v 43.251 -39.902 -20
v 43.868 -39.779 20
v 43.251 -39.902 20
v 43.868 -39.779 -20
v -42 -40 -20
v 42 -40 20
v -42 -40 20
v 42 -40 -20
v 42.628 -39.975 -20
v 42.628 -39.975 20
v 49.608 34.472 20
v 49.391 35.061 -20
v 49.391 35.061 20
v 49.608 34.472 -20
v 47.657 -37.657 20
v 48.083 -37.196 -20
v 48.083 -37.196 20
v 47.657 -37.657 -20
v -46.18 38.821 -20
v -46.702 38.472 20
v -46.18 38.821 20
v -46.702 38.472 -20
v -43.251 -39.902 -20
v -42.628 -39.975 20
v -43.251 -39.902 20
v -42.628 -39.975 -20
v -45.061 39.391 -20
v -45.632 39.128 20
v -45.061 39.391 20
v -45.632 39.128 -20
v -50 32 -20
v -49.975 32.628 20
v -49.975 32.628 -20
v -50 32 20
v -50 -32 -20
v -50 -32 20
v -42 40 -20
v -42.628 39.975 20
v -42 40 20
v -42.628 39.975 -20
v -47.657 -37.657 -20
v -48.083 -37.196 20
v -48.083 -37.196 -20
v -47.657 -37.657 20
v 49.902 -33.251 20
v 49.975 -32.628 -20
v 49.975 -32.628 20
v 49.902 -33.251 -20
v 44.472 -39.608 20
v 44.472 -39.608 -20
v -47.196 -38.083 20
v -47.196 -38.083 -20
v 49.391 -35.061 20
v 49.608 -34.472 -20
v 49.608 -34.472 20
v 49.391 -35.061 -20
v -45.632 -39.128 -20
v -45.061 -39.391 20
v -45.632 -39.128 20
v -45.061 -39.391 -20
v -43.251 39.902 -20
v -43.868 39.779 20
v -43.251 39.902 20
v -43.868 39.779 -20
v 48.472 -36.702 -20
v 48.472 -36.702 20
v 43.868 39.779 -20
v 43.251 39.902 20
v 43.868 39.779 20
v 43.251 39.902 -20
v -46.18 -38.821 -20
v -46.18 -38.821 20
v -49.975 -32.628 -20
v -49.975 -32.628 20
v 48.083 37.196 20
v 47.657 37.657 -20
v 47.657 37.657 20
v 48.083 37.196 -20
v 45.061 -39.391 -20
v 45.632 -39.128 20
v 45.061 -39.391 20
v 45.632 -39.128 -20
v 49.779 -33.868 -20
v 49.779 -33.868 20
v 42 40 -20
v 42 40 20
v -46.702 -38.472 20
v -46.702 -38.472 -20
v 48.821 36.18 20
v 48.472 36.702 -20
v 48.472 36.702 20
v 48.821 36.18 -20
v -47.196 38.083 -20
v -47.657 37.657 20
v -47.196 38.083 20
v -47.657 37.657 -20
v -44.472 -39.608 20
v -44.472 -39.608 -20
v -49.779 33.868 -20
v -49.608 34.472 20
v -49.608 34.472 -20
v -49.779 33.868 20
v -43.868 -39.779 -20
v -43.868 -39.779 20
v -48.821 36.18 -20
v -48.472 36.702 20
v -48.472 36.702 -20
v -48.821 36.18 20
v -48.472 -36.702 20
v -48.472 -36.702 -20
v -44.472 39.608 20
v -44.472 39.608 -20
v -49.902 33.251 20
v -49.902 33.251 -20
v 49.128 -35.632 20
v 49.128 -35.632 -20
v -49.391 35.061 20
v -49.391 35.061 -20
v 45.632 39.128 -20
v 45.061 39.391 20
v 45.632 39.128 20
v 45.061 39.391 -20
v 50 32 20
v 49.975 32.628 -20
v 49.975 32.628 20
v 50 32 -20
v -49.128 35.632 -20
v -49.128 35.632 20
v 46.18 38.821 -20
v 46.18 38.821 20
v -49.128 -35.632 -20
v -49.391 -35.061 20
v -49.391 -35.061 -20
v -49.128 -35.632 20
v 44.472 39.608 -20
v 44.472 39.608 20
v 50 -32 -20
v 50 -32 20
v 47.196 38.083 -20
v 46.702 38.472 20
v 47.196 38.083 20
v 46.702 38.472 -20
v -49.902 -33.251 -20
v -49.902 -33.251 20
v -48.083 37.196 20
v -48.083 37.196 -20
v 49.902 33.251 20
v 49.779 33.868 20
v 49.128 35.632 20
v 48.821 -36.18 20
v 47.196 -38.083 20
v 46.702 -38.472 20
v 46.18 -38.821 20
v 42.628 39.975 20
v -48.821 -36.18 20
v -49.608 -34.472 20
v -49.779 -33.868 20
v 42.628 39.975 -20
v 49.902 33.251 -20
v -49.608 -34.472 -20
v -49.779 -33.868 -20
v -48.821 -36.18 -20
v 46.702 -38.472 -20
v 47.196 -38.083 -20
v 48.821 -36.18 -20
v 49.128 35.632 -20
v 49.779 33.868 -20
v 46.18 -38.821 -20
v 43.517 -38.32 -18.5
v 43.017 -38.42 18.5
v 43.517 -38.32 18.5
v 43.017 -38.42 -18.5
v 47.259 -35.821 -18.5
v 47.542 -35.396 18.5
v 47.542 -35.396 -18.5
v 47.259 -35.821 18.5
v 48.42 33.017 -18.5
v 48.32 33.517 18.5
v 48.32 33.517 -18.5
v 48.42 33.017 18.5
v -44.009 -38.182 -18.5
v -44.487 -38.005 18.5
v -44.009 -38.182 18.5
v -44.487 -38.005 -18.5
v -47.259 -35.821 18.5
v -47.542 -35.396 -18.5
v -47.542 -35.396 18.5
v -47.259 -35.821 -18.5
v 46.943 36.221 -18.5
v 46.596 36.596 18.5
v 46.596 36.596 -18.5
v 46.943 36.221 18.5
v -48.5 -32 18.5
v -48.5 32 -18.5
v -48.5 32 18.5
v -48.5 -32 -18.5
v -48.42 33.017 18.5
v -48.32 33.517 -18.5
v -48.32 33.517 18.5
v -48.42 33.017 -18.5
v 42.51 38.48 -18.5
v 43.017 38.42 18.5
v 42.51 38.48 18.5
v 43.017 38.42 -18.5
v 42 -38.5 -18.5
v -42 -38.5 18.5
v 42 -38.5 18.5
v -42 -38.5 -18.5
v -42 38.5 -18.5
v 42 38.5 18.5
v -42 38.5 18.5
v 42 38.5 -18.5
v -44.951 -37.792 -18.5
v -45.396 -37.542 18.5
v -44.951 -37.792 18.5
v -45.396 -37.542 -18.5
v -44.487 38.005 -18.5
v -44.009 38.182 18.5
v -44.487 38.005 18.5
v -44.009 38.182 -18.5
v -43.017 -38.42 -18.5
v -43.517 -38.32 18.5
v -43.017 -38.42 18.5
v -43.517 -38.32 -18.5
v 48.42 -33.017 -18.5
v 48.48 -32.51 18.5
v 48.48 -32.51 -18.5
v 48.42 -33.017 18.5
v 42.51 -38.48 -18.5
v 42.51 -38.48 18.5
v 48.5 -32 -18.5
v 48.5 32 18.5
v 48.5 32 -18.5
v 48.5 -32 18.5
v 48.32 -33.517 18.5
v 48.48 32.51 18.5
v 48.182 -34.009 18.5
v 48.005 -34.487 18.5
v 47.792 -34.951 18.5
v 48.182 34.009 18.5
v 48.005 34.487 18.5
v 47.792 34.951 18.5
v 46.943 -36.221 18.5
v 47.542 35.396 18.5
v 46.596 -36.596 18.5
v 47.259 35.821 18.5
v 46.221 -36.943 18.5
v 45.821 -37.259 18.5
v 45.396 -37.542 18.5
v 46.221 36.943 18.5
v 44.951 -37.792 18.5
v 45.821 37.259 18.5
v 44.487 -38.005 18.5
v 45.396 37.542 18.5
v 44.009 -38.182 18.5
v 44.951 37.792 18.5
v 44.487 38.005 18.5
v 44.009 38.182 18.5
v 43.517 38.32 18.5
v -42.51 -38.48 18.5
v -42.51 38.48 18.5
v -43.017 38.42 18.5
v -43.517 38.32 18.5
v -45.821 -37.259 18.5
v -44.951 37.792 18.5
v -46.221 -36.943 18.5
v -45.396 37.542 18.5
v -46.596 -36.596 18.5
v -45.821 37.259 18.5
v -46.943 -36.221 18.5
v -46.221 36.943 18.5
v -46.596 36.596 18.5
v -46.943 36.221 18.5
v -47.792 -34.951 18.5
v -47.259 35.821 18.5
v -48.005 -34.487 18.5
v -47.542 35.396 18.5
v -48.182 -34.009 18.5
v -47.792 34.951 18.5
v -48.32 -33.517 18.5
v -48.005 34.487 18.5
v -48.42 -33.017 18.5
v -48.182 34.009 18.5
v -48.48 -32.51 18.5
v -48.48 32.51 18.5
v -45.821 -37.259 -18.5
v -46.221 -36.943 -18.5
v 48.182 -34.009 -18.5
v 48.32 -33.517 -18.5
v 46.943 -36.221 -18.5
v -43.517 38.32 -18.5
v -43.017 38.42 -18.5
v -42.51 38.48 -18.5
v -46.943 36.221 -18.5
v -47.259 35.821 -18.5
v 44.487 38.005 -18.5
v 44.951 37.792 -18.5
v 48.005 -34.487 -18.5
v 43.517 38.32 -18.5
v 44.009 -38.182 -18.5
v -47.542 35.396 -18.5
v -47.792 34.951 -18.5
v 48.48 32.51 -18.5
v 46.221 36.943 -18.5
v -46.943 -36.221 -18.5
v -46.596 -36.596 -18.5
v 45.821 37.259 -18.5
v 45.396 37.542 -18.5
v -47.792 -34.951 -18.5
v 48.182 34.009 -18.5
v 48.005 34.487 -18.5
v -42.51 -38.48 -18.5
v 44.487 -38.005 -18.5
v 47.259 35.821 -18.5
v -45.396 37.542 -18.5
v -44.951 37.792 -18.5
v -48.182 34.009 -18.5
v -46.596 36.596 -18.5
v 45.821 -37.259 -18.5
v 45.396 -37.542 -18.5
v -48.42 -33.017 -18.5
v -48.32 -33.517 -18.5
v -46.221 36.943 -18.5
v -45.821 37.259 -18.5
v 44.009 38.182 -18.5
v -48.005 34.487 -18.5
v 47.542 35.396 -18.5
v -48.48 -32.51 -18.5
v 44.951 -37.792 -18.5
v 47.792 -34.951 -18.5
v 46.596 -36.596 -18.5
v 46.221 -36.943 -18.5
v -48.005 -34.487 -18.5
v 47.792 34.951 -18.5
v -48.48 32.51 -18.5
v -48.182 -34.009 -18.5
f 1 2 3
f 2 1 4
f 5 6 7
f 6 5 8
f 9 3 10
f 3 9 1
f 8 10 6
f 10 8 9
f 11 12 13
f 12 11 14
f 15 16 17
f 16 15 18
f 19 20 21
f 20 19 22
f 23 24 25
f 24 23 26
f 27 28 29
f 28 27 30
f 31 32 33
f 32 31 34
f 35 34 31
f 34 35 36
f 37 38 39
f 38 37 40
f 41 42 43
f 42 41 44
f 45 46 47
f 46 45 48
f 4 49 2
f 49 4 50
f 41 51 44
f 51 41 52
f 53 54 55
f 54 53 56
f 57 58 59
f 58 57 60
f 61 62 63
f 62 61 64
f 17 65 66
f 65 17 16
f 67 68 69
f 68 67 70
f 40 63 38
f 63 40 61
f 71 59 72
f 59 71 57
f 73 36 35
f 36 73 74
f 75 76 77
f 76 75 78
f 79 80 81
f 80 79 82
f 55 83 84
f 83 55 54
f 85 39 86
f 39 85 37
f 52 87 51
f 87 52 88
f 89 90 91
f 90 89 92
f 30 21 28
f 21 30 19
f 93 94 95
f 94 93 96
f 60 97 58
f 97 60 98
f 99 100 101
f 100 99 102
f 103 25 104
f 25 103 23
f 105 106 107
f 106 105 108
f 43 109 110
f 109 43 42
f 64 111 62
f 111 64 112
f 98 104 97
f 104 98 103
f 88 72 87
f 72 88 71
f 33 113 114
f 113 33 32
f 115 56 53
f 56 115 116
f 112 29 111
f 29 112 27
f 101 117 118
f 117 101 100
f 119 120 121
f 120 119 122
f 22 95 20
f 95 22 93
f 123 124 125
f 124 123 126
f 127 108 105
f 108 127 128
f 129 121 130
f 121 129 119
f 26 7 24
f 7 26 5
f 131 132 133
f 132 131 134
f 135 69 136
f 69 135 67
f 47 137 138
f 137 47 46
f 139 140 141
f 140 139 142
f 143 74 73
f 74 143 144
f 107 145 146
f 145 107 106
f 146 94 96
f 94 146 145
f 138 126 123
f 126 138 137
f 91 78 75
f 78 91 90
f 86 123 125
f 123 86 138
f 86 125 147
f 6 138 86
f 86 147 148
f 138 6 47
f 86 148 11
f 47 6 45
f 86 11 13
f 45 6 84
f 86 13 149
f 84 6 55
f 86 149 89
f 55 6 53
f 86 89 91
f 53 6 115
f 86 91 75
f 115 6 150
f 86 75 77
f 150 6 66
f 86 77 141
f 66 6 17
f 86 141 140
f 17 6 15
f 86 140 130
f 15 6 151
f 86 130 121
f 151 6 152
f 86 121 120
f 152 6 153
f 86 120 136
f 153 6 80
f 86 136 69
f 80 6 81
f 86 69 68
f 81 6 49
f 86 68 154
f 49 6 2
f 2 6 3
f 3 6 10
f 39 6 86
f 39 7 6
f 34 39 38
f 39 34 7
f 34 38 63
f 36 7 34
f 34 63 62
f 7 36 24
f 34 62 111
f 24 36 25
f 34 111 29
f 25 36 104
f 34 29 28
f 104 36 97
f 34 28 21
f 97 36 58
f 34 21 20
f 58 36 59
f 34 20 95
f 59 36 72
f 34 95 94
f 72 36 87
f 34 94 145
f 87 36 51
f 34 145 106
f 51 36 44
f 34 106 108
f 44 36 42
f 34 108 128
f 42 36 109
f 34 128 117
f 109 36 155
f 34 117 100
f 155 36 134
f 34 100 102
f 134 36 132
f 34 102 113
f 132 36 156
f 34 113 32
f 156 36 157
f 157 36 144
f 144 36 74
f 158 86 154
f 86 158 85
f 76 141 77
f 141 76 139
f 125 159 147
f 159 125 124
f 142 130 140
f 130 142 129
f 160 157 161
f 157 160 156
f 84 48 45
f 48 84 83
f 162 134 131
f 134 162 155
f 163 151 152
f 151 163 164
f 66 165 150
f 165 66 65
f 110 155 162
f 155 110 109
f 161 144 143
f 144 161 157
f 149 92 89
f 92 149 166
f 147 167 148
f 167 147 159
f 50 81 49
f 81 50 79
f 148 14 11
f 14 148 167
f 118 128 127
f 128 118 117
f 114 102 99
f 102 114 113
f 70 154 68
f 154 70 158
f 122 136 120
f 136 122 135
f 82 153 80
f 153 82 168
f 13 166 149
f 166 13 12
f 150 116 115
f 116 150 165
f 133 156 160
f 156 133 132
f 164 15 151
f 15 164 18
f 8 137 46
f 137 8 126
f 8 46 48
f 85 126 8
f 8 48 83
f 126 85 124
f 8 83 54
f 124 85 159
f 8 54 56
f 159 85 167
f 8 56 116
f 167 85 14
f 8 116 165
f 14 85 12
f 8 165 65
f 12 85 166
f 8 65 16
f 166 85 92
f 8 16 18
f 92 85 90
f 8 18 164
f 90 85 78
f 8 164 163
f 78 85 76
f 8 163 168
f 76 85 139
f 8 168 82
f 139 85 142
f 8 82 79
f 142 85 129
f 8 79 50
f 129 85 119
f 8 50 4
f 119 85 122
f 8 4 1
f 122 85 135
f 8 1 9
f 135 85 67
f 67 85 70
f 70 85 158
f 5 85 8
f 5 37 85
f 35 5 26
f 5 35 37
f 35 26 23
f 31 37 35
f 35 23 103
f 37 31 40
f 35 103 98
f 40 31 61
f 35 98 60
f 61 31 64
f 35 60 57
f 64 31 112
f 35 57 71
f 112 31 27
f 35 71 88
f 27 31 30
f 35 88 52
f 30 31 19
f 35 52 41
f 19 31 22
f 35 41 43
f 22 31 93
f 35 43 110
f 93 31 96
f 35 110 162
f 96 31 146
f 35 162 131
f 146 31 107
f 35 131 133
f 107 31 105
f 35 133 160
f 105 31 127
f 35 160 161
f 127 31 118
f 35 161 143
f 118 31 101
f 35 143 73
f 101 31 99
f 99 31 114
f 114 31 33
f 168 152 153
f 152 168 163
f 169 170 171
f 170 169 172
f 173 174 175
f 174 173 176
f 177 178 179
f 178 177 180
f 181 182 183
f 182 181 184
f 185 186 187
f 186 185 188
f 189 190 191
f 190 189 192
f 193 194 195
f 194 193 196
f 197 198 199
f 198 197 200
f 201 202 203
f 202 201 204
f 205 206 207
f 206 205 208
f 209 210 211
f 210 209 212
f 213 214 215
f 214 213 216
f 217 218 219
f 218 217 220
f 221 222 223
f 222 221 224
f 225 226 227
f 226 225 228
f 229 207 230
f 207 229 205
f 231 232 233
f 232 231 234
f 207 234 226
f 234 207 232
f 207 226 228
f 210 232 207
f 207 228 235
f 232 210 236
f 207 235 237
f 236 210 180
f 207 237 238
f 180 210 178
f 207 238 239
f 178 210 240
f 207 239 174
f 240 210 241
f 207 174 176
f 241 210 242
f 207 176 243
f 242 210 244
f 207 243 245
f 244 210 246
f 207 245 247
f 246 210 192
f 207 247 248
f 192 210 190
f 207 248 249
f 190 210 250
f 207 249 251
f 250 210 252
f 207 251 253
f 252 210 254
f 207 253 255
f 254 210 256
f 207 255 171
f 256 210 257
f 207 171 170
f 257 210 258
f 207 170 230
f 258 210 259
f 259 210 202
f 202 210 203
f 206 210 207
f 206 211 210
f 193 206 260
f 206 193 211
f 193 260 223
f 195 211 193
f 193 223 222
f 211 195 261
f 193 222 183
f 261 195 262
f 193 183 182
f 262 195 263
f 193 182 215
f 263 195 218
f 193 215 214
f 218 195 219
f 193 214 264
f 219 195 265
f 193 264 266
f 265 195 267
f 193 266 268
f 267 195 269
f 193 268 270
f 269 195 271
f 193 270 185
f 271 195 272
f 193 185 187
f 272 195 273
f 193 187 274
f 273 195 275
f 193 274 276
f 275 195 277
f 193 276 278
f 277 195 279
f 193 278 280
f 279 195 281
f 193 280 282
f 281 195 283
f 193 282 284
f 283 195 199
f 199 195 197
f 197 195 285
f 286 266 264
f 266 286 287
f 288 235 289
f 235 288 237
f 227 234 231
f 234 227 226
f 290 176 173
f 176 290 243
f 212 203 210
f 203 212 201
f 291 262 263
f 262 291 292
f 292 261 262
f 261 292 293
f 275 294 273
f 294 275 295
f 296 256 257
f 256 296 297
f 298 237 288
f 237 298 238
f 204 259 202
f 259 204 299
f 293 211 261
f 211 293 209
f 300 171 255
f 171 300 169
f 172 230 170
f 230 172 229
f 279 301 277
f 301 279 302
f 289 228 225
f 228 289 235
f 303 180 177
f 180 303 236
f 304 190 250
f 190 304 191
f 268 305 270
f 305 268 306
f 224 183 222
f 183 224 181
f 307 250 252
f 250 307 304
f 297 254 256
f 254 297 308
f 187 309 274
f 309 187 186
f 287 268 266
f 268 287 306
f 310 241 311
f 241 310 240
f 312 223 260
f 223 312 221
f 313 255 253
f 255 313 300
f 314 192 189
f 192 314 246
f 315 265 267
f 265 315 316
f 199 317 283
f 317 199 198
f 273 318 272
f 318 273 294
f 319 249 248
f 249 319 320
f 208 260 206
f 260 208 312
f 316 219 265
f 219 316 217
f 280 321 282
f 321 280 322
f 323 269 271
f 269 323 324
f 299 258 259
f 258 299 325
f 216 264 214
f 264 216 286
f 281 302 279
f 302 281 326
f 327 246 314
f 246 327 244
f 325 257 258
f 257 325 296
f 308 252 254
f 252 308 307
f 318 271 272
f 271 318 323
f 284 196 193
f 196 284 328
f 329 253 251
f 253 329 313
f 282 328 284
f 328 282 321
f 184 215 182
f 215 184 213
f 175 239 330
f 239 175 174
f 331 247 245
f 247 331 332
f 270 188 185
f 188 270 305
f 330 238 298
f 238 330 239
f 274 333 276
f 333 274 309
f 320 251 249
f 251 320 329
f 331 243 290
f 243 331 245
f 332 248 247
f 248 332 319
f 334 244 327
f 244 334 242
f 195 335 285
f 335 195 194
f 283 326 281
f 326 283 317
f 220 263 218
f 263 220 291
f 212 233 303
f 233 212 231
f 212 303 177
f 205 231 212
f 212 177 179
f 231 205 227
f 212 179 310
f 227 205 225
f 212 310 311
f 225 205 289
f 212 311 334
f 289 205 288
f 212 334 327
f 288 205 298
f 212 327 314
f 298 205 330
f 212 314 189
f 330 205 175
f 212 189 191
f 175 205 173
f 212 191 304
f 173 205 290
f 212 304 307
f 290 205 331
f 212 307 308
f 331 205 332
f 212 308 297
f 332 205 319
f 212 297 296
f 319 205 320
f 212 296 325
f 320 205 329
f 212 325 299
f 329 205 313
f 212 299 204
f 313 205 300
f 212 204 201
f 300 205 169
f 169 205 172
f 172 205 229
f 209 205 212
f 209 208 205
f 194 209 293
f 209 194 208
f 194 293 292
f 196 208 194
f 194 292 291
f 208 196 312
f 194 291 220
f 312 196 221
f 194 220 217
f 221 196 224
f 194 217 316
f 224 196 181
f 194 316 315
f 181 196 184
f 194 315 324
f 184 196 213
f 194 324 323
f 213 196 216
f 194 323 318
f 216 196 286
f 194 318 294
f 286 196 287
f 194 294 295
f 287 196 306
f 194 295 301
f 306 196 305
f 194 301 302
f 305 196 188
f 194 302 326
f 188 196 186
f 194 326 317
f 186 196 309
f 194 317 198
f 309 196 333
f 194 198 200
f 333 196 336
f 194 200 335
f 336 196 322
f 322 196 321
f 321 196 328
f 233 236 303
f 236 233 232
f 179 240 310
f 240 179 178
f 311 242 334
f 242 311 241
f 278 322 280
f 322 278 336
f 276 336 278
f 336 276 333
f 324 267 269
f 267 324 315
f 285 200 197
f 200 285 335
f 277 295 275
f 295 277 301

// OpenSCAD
// Start: lazy_union
default_5_default_5();
// End: lazy_union

// Modules.

// 'PartMaterial undef-default - default 5.0'
module default_5_default_5() {
  // 'None : _combine_solids_and_holes'
  union() {
    // '_combine_solids_and_holes'
    difference() {
      // 'default : _combine_solids_and_holes'
      union() {
        // 'outer : _combine_solids_and_holes'
        union() {
          // 'hull'
          multmatrix(m=[[1.0, 0.0, 0.0, -50.0], [0.0, 1.0, 0.0, -40.0], [0.0, 0.0, 1.0, -20.0], [0.0, 0.0, 0.0, 1.0]]) {
            // 'hull : _combine_solids_and_holes'
            union() {
              // 'hull'
              linear_extrude(height=40.0, twist=0.0, slices=4, scale=[1.0, 1.0]) {
                polygon(points=[[8.0, 0.0], [92.0, 0.0], [92.62767276582277, 0.024661330134974513], [93.25147572032185, 0.09849327523889428], [93.86756291084724, 0.22104063681858133], [94.47213595499959, 0.39154786963876553], [95.06146745892073, 0.6089637399096981], [95.63192399791639, 0.8719478064930488], [96.1799885177276, 1.1788786851672537], [96.7022820183398, 1.5278640450004124], [97.19558438664149, 1.9167522751997437], [97.6568542494924, 2.3431457505076114], [98.08324772480026, 2.8044156133585236], [98.47213595499959, 3.297717981660207], [98.82112131483275, 3.8200114822724034], [99.12805219350696, 4.368076002083621], [99.3910362600903, 4.938532541079277], [99.60845213036124, 5.527864045000419], [99.77895936318143, 6.132437089152755], [99.90150672476112, 6.7485242796781515], [99.97533866986504, 7.37232723417724], [100.00000000000001, 8.0], [100.0, 72.0], [99.97533866986502, 72.62767276582277], [99.9015067247611, 73.25147572032185], [99.77895936318141, 73.86756291084724], [99.60845213036123, 74.47213595499957], [99.39103626009029, 75.06146745892072], [99.12805219350695, 75.63192399791637], [98.82112131483274, 76.17998851772758], [98.47213595499957, 76.70228201833977], [98.08324772480024, 77.19558438664146], [97.65685424949238, 77.65685424949237], [97.19558438664147, 78.08324772480023], [96.70228201833979, 78.47213595499957], [96.1799885177276, 78.82112131483272], [95.63192399791637, 79.12805219350693], [95.06146745892072, 79.39103626009027], [94.47213595499957, 79.60845213036121], [93.86756291084724, 79.77895936318139], [93.25147572032185, 79.90150672476108], [92.62767276582277, 79.975338669865], [92.0, 79.99999999999997], [8.0, 80.0], [7.37232723417724, 79.97533866986502], [6.748524279678152, 79.9015067247611], [6.132437089152757, 79.77895936318141], [5.52786404500042, 79.60845213036123], [4.938532541079281, 79.39103626009029], [4.368076002083625, 79.12805219350695], [3.8200114822724087, 78.82112131483274], [3.297717981660215, 78.47213595499957], [2.8044156133585307, 78.08324772480024], [2.3431457505076194, 77.65685424949238], [1.9167522751997517, 77.19558438664147], [1.5278640450004204, 76.70228201833979], [1.1788786851672617, 76.1799885177276], [0.8719478064930568, 75.63192399791637], [0.6089637399097052, 75.06146745892072], [0.39154786963877086, 74.47213595499959], [0.22104063681858666, 73.86756291084724], [0.09849327523889784, 73.25147572032185], [0.0246613301349754, 72.62767276582277], [-8.881784197001252e-16, 72.0], [0.0, 8.0], [0.02466133013497629, 7.372327234177241], [0.09849327523889784, 6.748524279678153], [0.22104063681858666, 6.1324370891527575], [0.39154786963877086, 5.527864045000421], [0.6089637399097052, 4.938532541079282], [0.8719478064930568, 4.368076002083626], [1.1788786851672617, 3.8200114822724105], [1.5278640450004204, 3.297717981660216], [1.9167522751997517, 2.8044156133585316], [2.3431457505076185, 2.3431457505076203], [2.8044156133585325, 1.9167522751997508], [3.297717981660214, 1.5278640450004213], [3.8200114822724114, 1.1788786851672608], [4.368076002083624, 0.8719478064930577], [4.938532541079277, 0.6089637399097079], [5.527864045000419, 0.39154786963877175], [6.132437089152758, 0.22104063681858666], [6.748524279678151, 0.09849327523889873], [7.372327234177234, 0.02466133013497629]]);
              }
            }
          }
        }
      }
      // 'default'
      union() {
        // 'hull'
        multmatrix(m=[[1.0, 0.0, 0.0, -48.5], [0.0, 1.0, 0.0, -38.5], [0.0, 0.0, 1.0, -18.5], [0.0, 0.0, 0.0, 1.0]]) {
          // 'hull : _combine_solids_and_holes'
          union() {
            // 'hull'
            linear_extrude(height=37.0, twist=0.0, slices=4, scale=[1.0, 1.0]) {
              polygon(points=[[6.5, 0.0], [90.5, 0.0], [91.00998412223099, 0.020037330734667513], [91.5168240227615, 0.08002578613160338], [92.01739486506338, 0.17959551741509916], [92.50861046343715, 0.31813264408149866], [92.98744231037308, 0.49478303867663254], [93.45093824830705, 0.7084575927756056], [93.89624067065367, 0.9578389316983973], [94.32060413990108, 1.2413895365628385], [94.72141231414619, 1.5573612235997958], [95.09619407771255, 1.9038059222874386], [95.4426387764002, 2.278587685853805], [95.75861046343715, 2.679395860098923], [96.0421610683016, 3.1037593293463317], [96.29154240722438, 3.5490617516929444], [96.50521696132336, 4.012557689626917], [96.68186735591848, 4.491389536562842], [96.82040448258489, 4.982605134936616], [96.91997421386839, 5.483175977238501], [96.97996266926532, 5.990015877769008], [96.99999999999997, 6.500000000000001], [97.0, 70.5], [96.97996266926533, 71.00998412223099], [96.9199742138684, 71.5168240227615], [96.8204044825849, 72.01739486506338], [96.6818673559185, 72.50861046343715], [96.50521696132336, 72.98744231037308], [96.2915424072244, 73.45093824830705], [96.0421610683016, 73.89624067065367], [95.75861046343715, 74.32060413990106], [95.4426387764002, 74.72141231414619], [95.09619407771255, 75.09619407771255], [94.72141231414619, 75.4426387764002], [94.32060413990108, 75.75861046343715], [93.89624067065367, 76.0421610683016], [93.45093824830705, 76.29154240722438], [92.98744231037308, 76.50521696132336], [92.50861046343715, 76.68186735591848], [92.01739486506338, 76.82040448258489], [91.5168240227615, 76.91997421386839], [91.00998412223099, 76.97996266926532], [90.5, 76.99999999999999], [6.5, 77.0], [5.990015877769007, 76.97996266926533], [5.483175977238499, 76.9199742138684], [4.982605134936614, 76.8204044825849], [4.491389536562842, 76.6818673559185], [4.012557689626916, 76.50521696132337], [3.5490617516929452, 76.2915424072244], [3.1037593293463317, 76.0421610683016], [2.6793958600989245, 75.75861046343715], [2.2785876858538057, 75.4426387764002], [1.9038059222874404, 75.09619407771255], [1.5573612235997984, 74.72141231414619], [1.2413895365628411, 74.32060413990108], [0.9578389316984, 73.89624067065367], [0.7084575927756083, 73.45093824830705], [0.4947830386766352, 72.98744231037308], [0.3181326440815013, 72.50861046343717], [0.17959551741510182, 72.01739486506338], [0.08002578613160427, 71.5168240227615], [0.020037330734667513, 71.00998412223099], [-8.881784197001252e-16, 70.5], [0.0, 6.5], [0.0200373307346684, 5.990015877769008], [0.08002578613160427, 5.483175977238499], [0.17959551741510182, 4.982605134936615], [0.3181326440815013, 4.491389536562842], [0.4947830386766352, 4.012557689626917], [0.7084575927756083, 3.5490617516929466], [0.9578389316984, 3.103759329346333], [1.2413895365628411, 2.679395860098925], [1.5573612235997984, 2.2785876858538066], [1.9038059222874395, 1.9038059222874413], [2.2785876858538074, 1.5573612235997976], [2.6793958600989236, 1.241389536562842], [3.103759329346334, 0.9578389316983991], [3.5490617516929444, 0.7084575927756092], [4.012557689626912, 0.49478303867663787], [4.49138953656284, 0.3181326440815022], [4.982605134936616, 0.17959551741510182], [5.483175977238497, 0.08002578613160516], [5.990015877769003, 0.0200373307346684]]);
            }
          }
        }
      }
    }
  }
} // end module default_5_default_5
